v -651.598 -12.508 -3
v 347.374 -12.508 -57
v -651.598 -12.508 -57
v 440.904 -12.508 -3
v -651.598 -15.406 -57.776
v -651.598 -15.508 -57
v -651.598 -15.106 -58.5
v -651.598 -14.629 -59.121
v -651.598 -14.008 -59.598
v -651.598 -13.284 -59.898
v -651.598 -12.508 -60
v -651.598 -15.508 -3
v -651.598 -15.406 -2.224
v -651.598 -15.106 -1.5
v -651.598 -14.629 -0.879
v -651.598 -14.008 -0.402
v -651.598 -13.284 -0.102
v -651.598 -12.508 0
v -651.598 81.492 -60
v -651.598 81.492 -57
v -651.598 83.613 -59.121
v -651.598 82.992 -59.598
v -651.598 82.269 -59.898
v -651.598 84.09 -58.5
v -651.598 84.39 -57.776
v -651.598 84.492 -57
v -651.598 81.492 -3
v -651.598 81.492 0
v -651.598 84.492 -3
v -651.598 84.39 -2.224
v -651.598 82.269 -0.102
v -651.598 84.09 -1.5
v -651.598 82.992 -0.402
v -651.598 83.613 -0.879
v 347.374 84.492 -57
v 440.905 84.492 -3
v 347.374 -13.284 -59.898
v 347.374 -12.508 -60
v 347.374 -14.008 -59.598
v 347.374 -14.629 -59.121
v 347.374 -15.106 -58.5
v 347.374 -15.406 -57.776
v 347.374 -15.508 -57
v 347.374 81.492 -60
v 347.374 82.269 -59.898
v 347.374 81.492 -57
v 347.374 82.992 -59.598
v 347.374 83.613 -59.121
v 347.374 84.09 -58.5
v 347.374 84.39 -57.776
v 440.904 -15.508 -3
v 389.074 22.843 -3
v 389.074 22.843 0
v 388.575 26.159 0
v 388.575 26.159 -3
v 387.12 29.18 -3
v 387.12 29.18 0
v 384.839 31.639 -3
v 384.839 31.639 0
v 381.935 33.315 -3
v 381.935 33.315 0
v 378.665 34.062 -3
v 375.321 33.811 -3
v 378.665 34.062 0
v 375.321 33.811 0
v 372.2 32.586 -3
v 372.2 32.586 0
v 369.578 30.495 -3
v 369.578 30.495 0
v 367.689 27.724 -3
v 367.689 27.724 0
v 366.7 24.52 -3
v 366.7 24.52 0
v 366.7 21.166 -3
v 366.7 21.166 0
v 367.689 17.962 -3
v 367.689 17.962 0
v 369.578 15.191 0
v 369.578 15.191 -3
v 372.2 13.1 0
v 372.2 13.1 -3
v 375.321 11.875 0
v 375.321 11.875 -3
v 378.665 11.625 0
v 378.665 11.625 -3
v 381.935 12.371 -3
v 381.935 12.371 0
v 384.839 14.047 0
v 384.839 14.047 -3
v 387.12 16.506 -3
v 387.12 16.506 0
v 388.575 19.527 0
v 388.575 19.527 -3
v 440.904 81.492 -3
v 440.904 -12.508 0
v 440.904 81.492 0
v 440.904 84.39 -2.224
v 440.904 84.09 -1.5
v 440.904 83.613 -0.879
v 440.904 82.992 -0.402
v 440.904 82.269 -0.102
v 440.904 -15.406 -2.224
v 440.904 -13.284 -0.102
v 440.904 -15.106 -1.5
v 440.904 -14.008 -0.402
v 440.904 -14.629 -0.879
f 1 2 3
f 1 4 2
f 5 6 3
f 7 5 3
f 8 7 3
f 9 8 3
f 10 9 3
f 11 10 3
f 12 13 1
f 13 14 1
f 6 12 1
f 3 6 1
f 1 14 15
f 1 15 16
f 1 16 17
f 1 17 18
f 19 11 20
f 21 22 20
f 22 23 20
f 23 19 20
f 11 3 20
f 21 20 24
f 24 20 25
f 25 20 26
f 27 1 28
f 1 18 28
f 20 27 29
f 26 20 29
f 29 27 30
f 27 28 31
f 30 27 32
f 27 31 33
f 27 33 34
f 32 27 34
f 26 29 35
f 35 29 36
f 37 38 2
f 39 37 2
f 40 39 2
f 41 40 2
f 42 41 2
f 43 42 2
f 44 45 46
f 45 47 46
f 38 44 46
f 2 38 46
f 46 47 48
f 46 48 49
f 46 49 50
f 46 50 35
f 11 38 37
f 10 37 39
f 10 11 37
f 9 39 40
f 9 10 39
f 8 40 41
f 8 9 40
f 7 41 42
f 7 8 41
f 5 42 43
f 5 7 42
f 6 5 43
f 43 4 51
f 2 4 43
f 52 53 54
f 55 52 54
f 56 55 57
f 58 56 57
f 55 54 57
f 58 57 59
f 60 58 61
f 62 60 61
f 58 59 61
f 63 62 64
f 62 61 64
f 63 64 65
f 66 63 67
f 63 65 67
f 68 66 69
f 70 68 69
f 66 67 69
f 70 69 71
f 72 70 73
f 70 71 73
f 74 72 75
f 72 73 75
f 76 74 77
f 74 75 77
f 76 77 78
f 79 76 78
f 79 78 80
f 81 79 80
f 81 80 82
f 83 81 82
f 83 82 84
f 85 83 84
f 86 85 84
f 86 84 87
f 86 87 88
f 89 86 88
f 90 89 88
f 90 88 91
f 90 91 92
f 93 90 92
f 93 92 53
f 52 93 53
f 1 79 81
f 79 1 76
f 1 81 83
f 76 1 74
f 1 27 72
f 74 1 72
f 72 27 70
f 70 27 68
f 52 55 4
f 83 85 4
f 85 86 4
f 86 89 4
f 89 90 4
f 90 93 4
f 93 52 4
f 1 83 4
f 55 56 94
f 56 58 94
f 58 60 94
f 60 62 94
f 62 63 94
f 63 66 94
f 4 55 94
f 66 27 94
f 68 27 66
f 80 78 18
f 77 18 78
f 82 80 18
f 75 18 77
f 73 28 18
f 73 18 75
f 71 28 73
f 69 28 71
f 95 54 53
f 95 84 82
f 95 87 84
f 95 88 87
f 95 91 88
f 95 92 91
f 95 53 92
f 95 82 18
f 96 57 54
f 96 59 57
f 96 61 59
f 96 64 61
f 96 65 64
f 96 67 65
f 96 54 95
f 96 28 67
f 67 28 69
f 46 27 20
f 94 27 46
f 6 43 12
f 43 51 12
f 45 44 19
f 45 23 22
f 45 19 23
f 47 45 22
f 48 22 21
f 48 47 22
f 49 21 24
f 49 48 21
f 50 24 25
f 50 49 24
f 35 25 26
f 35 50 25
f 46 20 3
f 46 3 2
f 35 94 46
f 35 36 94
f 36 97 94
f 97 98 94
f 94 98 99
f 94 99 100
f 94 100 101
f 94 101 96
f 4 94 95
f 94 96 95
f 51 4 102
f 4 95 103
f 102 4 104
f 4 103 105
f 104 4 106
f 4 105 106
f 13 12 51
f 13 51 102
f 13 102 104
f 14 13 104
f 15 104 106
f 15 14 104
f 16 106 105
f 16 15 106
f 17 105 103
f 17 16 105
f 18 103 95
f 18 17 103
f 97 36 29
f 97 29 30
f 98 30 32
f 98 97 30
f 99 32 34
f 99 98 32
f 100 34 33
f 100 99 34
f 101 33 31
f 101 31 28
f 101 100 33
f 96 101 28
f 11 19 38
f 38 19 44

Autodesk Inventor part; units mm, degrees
ref_plane "YZ Plane" through (0, 0, 0) normal (1, 0, 0) x (0, 1, 0)
ref_plane "XZ Plane" through (0, 0, 0) normal (0, 1, 0) x (-1, 0, 0)
ref_plane "XY Plane" through (0, 0, 0) normal (0, 0, 1) x (1, 0, 0)
sketch "Sketch1" plane through (0, 0, 0) normal (0, 0, 1) x (1, 0, 0)
  line L0 (-651.5983, 84.4921) -> (440.9045, 84.4921)
  line L1 (440.9045, 84.4921) -> (440.9045, -15.5079)
  line L2 (440.9045, -15.5079) -> (-651.5983, -15.5079)
  line L3 (-651.5983, -15.5079) -> (-651.5983, 84.4921)
  line L4 (-651.5983, -15.5079) -> (-899.2765, -81.873) projected
  point P0 (0, 0)
  dimension "d0" = 100
extrude "Extrusion1" add sketch "Sketch1" against normal blind 60
fillet "Fillet1" radius 3 4 edges at (-105.3469, 84.4921, 0) (-105.3469, 84.4921, -60) (-105.3469, -15.5079, 0) (-105.3469, -15.5079, -60)
shell "Shell1" thickness 3 removed faces 2 at (440.9045, 18.8255, -40) at (-651.5983, 18.8255, -40)
sketch "Sketch2" plane through (0, 0, 0) normal (0, 0, 1) x (1, 0, 0)
  circle A0 centre (377.8245, 22.8431) radius 11.25 projected
  point P0 (0, 0)
extrude "Extrusion2" cut sketch "Sketch2" against normal through all
sketch "Sketch3" plane through (-651.5983, 84.4921, -57) normal (0, 1, 0) x (1, 0, 0)
  line L0 (0, 0) -> (1092.5029, 0) projected
  line L1 (0, -54) -> (0, 0) projected
  line L2 (1092.5029, -54) -> (0, -54) projected
  line L3 (1092.5029, -54) -> (1092.5029, 0) projected
  line L4 (1092.5029, -54) -> (998.9721, 0)
  line L5 (0, 0) -> (1092.5029, 0) projected
  line L6 (1092.5029, -54) -> (1101.6667, -54)
  line L7 (1101.6667, -54) -> (1101.6667, 18.4263)
  line L8 (1101.6667, 18.4263) -> (998.9721, 18.4263)
  line L9 (998.9721, 18.4263) -> (998.9721, 0)
  point P0 (651.5983, -57)
  dimension "d8" = 30
extrude "Extrusion3" cut sketch "Sketch3" against normal through all contours L9 L8 L7 L6 L3 L0 | L0 L3 L4
properties part number "Barra nuevo pivote"
